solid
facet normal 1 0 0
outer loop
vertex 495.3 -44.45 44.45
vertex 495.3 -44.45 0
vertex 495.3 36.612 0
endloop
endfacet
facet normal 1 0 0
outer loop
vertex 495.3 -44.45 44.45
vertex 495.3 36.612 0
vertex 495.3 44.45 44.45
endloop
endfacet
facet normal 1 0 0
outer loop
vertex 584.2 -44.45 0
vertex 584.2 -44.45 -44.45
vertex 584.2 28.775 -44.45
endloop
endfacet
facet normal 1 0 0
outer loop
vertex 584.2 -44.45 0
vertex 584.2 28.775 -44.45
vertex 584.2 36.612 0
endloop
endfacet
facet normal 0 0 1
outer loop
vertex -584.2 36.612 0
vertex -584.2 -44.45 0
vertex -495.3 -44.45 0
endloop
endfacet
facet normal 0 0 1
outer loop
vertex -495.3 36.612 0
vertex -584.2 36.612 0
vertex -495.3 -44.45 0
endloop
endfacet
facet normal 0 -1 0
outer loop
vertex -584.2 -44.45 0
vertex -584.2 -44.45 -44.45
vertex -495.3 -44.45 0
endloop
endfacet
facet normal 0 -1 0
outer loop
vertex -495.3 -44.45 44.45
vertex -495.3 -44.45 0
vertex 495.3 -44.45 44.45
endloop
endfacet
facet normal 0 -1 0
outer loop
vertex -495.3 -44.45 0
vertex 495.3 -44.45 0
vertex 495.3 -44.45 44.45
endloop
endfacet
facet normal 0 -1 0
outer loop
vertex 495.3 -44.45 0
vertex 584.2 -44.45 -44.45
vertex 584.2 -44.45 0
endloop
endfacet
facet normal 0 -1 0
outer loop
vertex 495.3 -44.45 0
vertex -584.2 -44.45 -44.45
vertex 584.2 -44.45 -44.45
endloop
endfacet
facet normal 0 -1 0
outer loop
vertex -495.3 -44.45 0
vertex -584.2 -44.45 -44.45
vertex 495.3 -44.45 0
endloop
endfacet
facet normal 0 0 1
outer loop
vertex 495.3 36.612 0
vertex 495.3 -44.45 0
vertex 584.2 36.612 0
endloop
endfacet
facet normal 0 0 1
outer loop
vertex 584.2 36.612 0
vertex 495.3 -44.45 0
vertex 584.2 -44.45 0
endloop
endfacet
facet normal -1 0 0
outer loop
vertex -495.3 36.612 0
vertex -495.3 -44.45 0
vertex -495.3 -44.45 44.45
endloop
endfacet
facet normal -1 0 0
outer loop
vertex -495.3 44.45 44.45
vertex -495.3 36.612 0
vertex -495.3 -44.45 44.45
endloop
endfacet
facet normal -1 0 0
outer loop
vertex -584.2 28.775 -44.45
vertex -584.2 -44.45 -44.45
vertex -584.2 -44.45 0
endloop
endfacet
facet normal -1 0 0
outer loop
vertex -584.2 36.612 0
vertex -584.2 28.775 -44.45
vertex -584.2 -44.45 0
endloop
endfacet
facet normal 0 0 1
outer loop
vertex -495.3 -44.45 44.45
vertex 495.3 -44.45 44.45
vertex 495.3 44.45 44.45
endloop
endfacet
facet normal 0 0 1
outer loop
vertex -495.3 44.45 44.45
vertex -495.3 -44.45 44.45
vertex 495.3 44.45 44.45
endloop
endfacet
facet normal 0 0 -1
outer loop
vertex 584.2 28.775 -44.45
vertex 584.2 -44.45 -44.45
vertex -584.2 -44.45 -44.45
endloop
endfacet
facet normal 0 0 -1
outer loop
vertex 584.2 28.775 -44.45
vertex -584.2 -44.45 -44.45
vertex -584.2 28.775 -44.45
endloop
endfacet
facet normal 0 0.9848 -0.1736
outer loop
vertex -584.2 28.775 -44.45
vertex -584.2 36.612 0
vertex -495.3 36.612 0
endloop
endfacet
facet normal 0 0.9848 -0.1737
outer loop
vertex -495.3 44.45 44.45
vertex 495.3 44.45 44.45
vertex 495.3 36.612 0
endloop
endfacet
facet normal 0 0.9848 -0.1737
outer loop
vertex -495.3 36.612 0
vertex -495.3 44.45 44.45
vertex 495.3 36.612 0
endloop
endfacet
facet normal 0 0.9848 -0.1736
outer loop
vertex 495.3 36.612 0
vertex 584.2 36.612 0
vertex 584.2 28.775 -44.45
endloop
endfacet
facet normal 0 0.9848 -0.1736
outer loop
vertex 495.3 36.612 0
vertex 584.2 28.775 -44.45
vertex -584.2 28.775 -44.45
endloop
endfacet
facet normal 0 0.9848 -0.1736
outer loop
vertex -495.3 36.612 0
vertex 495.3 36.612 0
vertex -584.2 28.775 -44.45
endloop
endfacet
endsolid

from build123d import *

# Parameters (mm, degrees)
F0_W     = 88.9
F0_H     = 88.9
F1_DEPTH = 673.1
F2_W     = 88.9
F2_H     = 44.45
F3_DEPTH = 88.901
F5_DEPTH = 1346.201
F6_W     = 88.9
F6_H     = 88.9
F7_DEPTH = 88.901


with BuildPart() as f1:
    # F0 (on Right) → F1 (new body, symmetric)
    with BuildSketch(Plane.YZ):
        Rectangle(F0_W, F0_H)
    extrude(amount=F1_DEPTH, both=True)

    # F2 (on face) → F3 (cut, through all)
    with BuildSketch(Plane.XZ.offset(44.45)):
        with Locations((-539.75, 22.225)):
            Rectangle(F2_W, F2_H)
        with Locations((539.75, 22.225)):
            Rectangle(F2_W, F2_H)
    extrude(amount=-F3_DEPTH, mode=Mode.SUBTRACT)

    # F4 (on face) → F5 (cut, through all)
    with BuildSketch(Plane.YZ.offset(673.1)):
        Polygon((44.45, -44.45), (44.45, 44.45), (28.774531, -44.45), align=None)
    extrude(amount=-F5_DEPTH, mode=Mode.SUBTRACT)

    # F6 (on face) → F7 (cut, through all)
    with BuildSketch(Plane.XZ.offset(44.45)):
        with Locations((-628.65, 0)):
            Rectangle(F6_W, F6_H)
        with Locations((628.65, 0)):
            Rectangle(F6_W, F6_H)
    extrude(amount=-F7_DEPTH, mode=Mode.SUBTRACT)


solid = f1.part
